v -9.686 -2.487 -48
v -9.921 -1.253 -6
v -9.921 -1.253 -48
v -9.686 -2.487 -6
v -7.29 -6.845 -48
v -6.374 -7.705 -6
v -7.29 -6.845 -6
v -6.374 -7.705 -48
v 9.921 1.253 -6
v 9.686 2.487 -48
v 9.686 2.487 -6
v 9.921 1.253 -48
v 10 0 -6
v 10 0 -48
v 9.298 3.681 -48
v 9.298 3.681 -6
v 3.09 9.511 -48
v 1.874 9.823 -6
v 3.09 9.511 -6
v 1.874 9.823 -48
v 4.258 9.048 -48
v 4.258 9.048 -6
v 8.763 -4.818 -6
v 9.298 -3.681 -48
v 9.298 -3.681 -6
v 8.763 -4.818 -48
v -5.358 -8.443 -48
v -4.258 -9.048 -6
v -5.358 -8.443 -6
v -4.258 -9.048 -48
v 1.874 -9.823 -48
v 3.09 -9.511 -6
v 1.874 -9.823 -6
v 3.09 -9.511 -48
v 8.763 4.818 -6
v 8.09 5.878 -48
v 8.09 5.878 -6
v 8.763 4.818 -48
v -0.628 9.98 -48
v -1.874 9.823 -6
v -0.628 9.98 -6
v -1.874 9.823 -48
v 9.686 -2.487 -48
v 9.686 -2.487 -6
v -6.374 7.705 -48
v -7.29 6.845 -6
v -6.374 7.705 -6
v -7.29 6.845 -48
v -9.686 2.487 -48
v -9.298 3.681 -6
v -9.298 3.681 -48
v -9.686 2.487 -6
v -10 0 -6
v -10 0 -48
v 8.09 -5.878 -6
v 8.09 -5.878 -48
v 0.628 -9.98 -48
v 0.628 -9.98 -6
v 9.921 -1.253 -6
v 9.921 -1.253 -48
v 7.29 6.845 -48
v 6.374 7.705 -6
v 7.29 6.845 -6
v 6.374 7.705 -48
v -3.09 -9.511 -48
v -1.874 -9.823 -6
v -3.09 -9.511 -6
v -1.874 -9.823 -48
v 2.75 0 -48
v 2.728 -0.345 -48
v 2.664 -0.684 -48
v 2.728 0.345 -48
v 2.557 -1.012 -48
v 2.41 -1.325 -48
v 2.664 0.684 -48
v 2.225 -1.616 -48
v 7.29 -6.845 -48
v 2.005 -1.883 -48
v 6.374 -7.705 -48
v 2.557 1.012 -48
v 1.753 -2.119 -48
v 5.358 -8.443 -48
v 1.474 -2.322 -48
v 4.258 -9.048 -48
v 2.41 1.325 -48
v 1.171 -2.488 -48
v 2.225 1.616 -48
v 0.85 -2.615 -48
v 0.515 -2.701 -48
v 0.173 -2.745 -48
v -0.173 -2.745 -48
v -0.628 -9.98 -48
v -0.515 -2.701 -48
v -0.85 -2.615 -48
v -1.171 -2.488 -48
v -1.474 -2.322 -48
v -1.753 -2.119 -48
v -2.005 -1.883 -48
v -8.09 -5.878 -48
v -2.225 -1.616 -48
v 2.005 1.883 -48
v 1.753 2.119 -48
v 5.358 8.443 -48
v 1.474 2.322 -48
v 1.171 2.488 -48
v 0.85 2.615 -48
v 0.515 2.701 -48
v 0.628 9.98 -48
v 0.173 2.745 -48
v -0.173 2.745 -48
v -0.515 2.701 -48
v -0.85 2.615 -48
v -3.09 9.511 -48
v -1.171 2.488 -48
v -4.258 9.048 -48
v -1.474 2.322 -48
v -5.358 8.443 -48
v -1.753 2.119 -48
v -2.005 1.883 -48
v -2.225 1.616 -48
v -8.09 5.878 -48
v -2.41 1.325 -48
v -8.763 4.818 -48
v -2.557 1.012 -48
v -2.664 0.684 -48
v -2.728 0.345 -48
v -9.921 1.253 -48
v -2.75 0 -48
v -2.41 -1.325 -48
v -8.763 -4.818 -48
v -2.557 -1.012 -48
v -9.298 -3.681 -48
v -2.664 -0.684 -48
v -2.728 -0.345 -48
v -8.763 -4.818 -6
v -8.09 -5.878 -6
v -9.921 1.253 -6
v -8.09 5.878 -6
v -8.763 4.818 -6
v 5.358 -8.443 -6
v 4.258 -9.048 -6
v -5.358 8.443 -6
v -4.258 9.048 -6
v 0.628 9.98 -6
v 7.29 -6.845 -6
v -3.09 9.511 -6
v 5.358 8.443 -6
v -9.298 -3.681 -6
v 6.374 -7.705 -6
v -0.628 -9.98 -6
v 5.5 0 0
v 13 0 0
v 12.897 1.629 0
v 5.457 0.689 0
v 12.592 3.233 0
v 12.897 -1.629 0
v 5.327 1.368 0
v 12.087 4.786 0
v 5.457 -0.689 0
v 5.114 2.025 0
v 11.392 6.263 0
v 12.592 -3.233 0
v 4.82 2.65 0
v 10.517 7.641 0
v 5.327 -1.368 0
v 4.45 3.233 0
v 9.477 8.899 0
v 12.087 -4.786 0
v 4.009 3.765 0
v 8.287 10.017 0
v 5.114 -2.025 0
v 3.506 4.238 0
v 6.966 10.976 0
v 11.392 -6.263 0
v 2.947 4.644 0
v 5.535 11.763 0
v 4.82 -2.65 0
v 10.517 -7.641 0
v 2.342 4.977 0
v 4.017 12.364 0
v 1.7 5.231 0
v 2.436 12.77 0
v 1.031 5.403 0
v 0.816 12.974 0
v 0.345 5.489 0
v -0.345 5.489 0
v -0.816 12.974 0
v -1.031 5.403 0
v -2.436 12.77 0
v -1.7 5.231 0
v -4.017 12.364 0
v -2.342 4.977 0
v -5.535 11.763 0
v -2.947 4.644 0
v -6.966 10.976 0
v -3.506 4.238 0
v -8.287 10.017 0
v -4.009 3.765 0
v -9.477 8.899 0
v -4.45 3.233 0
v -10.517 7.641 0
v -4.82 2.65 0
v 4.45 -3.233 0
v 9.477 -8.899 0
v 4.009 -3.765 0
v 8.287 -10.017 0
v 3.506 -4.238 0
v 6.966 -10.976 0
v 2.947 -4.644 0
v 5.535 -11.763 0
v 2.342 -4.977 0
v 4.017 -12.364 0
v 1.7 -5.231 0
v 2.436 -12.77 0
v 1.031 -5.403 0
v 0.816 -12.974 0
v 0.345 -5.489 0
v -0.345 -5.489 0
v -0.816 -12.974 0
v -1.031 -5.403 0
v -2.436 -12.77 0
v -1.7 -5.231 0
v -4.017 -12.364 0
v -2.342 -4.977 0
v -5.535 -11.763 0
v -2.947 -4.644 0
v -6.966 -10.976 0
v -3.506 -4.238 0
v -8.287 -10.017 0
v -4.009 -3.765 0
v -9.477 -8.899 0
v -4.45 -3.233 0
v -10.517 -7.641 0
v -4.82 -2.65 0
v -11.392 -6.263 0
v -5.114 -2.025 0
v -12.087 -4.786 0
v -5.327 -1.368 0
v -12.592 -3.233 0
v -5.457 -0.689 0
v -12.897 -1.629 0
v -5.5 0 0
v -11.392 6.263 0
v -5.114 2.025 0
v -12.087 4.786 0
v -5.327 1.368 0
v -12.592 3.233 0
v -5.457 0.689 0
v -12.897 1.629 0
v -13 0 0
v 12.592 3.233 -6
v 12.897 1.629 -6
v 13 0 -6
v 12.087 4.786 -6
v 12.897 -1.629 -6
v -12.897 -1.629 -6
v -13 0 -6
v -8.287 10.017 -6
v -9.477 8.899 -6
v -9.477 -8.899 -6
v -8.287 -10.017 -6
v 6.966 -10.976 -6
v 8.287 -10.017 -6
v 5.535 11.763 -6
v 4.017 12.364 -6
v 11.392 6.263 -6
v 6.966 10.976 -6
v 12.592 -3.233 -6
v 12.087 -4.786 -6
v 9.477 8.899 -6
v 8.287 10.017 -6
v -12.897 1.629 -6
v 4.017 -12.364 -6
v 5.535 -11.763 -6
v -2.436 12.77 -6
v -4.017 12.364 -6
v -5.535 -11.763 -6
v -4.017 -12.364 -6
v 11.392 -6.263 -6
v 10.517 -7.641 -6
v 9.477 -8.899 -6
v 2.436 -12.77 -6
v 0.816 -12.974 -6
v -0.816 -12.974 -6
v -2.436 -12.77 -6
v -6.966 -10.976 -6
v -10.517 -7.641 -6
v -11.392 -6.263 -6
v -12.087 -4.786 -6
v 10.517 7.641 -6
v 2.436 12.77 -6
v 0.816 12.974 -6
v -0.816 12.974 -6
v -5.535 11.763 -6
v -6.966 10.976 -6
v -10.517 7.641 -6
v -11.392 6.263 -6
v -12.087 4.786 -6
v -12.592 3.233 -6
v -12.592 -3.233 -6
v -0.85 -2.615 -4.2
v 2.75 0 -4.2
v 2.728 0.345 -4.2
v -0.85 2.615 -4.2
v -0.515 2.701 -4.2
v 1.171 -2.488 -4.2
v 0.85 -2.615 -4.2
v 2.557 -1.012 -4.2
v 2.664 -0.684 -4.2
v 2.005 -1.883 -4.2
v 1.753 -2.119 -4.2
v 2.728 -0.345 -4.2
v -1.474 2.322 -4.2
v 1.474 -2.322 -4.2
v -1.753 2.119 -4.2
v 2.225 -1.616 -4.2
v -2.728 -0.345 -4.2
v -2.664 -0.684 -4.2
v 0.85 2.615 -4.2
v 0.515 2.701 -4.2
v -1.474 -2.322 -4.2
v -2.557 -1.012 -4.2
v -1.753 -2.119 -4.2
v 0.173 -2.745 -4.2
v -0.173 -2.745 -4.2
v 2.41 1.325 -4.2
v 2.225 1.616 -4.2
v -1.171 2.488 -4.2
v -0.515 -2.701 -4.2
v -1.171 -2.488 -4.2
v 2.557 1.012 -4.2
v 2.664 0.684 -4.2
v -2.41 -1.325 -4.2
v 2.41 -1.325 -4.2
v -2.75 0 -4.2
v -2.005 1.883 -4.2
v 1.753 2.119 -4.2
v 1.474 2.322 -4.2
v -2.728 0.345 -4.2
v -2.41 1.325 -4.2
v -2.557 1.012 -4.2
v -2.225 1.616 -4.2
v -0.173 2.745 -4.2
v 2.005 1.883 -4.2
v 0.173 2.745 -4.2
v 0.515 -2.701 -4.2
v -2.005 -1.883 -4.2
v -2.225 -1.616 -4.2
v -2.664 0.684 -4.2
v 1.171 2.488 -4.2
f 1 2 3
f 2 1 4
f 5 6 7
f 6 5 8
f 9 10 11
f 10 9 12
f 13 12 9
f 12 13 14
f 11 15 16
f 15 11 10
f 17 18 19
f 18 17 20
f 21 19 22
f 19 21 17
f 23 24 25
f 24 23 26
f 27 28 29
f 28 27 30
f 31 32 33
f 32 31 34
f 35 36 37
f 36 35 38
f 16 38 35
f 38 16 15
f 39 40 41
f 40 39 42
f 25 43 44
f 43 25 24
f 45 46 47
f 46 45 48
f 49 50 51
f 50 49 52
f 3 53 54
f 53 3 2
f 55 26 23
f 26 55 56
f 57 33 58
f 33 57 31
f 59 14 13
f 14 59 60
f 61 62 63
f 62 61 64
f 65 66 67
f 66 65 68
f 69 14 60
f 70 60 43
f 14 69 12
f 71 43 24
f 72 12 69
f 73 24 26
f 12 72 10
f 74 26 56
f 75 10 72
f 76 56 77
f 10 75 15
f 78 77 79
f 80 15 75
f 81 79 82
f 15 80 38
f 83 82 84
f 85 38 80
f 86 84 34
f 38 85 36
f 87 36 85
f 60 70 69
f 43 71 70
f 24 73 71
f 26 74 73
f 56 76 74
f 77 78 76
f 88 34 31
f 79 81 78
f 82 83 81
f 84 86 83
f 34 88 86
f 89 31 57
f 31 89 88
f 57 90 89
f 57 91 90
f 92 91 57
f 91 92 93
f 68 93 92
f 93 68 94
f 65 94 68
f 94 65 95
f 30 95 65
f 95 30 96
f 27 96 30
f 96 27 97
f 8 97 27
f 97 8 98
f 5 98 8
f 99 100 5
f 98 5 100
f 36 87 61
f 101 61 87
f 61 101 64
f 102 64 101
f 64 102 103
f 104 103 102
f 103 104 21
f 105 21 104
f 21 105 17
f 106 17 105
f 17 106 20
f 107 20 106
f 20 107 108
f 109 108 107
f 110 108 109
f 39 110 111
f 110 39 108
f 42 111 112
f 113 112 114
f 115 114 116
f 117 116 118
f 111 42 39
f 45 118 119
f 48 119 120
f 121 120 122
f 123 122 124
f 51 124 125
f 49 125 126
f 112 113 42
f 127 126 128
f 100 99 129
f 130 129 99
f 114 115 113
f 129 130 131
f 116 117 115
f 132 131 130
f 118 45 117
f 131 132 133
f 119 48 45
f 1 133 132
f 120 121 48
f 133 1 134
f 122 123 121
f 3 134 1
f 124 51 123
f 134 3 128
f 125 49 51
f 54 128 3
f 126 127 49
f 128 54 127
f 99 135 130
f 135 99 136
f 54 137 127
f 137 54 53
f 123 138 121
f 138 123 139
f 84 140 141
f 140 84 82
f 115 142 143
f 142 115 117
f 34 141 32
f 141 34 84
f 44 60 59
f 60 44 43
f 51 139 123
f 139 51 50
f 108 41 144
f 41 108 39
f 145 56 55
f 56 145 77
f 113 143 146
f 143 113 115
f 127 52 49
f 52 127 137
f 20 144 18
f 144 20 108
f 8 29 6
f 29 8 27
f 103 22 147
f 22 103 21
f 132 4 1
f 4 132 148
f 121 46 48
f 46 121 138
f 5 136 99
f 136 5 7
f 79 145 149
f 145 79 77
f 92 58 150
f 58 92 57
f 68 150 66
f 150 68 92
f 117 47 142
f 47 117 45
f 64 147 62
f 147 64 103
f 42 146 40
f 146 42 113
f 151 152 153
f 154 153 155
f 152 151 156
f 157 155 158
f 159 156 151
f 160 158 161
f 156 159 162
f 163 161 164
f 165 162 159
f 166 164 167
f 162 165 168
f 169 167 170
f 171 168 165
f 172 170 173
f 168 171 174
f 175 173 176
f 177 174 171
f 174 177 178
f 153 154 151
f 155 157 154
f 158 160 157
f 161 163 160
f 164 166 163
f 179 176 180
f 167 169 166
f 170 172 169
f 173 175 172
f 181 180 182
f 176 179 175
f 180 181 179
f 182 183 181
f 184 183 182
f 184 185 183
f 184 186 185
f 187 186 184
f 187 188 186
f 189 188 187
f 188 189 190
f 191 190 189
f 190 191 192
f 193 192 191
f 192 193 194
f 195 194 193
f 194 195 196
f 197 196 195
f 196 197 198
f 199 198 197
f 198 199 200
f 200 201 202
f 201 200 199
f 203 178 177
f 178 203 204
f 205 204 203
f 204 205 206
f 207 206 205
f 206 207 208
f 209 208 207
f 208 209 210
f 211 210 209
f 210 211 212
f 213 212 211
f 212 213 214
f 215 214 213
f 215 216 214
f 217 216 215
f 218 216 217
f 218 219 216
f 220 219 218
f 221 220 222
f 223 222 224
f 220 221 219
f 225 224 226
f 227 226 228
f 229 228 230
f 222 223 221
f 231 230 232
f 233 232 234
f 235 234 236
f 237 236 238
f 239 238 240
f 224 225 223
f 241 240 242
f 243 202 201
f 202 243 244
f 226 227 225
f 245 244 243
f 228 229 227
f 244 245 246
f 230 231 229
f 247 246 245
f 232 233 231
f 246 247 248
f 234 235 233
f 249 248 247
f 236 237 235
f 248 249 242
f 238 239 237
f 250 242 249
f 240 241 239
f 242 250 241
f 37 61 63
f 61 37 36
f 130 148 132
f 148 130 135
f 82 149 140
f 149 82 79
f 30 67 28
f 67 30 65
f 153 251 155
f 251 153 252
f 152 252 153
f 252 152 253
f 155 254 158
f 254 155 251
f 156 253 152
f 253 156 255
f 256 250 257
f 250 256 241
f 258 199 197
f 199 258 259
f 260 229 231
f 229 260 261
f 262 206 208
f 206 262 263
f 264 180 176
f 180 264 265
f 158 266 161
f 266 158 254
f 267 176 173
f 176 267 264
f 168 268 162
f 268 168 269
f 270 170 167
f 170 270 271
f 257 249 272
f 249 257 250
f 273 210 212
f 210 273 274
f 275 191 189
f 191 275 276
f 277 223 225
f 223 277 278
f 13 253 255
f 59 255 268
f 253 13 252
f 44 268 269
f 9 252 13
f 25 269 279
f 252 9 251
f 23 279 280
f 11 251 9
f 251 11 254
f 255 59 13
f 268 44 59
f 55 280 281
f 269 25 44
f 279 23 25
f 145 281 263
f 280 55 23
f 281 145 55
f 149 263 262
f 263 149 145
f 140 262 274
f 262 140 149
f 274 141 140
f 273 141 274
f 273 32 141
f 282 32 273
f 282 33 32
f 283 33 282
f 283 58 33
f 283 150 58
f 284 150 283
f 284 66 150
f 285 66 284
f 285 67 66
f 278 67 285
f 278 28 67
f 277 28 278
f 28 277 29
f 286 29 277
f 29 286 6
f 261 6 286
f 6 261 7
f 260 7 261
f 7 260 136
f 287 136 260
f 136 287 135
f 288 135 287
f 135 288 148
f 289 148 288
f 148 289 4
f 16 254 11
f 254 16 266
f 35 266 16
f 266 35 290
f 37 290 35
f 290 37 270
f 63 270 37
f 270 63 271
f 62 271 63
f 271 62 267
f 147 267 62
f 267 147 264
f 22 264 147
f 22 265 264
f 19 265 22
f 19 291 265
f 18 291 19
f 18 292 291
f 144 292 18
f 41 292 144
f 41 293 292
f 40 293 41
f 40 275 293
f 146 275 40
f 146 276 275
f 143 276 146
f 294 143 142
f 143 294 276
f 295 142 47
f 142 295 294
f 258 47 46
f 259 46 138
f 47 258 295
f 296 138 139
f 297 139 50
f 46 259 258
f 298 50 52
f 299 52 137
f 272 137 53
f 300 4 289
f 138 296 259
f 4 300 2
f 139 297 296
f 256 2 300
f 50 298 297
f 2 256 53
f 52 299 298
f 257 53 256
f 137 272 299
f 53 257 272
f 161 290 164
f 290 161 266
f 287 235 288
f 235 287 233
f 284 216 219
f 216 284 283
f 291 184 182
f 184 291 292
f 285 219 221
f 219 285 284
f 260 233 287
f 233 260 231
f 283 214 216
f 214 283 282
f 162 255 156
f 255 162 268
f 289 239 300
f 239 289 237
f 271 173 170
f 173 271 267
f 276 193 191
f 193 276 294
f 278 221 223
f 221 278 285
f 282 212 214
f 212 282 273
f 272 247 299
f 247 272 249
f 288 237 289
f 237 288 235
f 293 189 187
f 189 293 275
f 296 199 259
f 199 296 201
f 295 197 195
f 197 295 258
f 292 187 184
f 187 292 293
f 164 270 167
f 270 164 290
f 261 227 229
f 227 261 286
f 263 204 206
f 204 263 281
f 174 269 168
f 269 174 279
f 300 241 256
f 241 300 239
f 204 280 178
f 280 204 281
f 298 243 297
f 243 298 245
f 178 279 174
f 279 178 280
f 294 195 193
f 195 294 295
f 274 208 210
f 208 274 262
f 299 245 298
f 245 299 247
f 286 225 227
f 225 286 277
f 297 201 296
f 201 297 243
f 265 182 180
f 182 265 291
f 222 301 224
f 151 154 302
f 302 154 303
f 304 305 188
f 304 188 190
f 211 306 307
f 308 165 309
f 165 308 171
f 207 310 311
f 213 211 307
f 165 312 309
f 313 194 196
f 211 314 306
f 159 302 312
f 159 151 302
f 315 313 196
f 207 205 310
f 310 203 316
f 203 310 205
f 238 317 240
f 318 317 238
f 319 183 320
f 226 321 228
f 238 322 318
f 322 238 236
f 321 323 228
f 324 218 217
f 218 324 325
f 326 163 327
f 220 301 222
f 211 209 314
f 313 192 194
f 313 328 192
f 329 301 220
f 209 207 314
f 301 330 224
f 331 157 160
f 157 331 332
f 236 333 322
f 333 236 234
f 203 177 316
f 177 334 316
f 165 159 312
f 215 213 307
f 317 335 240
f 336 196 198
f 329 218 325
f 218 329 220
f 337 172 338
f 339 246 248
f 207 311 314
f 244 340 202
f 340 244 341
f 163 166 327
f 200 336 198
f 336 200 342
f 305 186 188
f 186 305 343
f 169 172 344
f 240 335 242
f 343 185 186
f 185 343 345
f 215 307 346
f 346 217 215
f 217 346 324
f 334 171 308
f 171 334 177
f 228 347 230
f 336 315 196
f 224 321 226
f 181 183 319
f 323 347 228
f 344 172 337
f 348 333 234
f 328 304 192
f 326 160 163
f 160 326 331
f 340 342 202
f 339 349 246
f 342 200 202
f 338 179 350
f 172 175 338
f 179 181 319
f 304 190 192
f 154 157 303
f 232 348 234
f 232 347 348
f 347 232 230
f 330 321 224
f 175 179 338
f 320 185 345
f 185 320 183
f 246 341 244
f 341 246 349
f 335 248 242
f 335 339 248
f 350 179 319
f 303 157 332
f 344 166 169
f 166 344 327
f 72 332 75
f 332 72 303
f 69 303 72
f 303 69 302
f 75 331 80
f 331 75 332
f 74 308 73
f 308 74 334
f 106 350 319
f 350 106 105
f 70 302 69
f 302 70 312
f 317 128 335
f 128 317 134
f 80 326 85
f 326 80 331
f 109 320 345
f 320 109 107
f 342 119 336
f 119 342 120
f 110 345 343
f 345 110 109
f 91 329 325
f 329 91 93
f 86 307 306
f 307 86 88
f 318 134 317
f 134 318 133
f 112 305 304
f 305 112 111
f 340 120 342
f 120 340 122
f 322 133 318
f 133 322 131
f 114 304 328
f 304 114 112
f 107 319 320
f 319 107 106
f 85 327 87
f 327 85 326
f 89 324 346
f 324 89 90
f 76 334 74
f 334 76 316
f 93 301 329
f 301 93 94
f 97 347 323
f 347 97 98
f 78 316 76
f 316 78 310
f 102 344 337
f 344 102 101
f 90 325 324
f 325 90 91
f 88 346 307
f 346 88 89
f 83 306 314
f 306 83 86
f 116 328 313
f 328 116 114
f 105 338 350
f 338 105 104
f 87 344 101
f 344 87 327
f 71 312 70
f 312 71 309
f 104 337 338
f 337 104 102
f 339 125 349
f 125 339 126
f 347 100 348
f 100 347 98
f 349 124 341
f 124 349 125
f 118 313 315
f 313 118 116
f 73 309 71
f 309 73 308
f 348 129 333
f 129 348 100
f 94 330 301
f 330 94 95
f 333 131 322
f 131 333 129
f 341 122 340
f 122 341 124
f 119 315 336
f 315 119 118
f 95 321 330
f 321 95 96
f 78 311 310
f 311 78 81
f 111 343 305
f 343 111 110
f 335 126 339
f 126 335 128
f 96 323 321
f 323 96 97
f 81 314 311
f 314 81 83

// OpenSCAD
$fn = 50;


difference() {
	union() {
		translate(v = [0, 0, -48.0000000000]) {
			cylinder(h = 48, r = 10.0000000000);
		}
		translate(v = [0, 0, -6.0000000000]) {
			cylinder(h = 6, r = 13.0000000000);
		}
	}
	union() {
		translate(v = [0, 0, 0]) {
			rotate(a = [0, 0, 0]) {
				difference() {
					union() {
						#translate(v = [0, 0, -48.0000000000]) {
							cylinder(h = 48, r = 2.2500000000);
						}
						#translate(v = [0, 0, -4.2000000000]) {
							cylinder(h = 4.2000000000, r = 10.0000000000, r1 = 2.7500000000, r2 = 5.5000000000);
						}
						#translate(v = [0, 0, -48.0000000000]) {
							cylinder(h = 48, r = 2.7500000000);
						}
						#translate(v = [0, 0, -48.0000000000]) {
							cylinder(h = 48, r = 2.2500000000);
						}
					}
					union();
				}
			}
		}
	}
}
